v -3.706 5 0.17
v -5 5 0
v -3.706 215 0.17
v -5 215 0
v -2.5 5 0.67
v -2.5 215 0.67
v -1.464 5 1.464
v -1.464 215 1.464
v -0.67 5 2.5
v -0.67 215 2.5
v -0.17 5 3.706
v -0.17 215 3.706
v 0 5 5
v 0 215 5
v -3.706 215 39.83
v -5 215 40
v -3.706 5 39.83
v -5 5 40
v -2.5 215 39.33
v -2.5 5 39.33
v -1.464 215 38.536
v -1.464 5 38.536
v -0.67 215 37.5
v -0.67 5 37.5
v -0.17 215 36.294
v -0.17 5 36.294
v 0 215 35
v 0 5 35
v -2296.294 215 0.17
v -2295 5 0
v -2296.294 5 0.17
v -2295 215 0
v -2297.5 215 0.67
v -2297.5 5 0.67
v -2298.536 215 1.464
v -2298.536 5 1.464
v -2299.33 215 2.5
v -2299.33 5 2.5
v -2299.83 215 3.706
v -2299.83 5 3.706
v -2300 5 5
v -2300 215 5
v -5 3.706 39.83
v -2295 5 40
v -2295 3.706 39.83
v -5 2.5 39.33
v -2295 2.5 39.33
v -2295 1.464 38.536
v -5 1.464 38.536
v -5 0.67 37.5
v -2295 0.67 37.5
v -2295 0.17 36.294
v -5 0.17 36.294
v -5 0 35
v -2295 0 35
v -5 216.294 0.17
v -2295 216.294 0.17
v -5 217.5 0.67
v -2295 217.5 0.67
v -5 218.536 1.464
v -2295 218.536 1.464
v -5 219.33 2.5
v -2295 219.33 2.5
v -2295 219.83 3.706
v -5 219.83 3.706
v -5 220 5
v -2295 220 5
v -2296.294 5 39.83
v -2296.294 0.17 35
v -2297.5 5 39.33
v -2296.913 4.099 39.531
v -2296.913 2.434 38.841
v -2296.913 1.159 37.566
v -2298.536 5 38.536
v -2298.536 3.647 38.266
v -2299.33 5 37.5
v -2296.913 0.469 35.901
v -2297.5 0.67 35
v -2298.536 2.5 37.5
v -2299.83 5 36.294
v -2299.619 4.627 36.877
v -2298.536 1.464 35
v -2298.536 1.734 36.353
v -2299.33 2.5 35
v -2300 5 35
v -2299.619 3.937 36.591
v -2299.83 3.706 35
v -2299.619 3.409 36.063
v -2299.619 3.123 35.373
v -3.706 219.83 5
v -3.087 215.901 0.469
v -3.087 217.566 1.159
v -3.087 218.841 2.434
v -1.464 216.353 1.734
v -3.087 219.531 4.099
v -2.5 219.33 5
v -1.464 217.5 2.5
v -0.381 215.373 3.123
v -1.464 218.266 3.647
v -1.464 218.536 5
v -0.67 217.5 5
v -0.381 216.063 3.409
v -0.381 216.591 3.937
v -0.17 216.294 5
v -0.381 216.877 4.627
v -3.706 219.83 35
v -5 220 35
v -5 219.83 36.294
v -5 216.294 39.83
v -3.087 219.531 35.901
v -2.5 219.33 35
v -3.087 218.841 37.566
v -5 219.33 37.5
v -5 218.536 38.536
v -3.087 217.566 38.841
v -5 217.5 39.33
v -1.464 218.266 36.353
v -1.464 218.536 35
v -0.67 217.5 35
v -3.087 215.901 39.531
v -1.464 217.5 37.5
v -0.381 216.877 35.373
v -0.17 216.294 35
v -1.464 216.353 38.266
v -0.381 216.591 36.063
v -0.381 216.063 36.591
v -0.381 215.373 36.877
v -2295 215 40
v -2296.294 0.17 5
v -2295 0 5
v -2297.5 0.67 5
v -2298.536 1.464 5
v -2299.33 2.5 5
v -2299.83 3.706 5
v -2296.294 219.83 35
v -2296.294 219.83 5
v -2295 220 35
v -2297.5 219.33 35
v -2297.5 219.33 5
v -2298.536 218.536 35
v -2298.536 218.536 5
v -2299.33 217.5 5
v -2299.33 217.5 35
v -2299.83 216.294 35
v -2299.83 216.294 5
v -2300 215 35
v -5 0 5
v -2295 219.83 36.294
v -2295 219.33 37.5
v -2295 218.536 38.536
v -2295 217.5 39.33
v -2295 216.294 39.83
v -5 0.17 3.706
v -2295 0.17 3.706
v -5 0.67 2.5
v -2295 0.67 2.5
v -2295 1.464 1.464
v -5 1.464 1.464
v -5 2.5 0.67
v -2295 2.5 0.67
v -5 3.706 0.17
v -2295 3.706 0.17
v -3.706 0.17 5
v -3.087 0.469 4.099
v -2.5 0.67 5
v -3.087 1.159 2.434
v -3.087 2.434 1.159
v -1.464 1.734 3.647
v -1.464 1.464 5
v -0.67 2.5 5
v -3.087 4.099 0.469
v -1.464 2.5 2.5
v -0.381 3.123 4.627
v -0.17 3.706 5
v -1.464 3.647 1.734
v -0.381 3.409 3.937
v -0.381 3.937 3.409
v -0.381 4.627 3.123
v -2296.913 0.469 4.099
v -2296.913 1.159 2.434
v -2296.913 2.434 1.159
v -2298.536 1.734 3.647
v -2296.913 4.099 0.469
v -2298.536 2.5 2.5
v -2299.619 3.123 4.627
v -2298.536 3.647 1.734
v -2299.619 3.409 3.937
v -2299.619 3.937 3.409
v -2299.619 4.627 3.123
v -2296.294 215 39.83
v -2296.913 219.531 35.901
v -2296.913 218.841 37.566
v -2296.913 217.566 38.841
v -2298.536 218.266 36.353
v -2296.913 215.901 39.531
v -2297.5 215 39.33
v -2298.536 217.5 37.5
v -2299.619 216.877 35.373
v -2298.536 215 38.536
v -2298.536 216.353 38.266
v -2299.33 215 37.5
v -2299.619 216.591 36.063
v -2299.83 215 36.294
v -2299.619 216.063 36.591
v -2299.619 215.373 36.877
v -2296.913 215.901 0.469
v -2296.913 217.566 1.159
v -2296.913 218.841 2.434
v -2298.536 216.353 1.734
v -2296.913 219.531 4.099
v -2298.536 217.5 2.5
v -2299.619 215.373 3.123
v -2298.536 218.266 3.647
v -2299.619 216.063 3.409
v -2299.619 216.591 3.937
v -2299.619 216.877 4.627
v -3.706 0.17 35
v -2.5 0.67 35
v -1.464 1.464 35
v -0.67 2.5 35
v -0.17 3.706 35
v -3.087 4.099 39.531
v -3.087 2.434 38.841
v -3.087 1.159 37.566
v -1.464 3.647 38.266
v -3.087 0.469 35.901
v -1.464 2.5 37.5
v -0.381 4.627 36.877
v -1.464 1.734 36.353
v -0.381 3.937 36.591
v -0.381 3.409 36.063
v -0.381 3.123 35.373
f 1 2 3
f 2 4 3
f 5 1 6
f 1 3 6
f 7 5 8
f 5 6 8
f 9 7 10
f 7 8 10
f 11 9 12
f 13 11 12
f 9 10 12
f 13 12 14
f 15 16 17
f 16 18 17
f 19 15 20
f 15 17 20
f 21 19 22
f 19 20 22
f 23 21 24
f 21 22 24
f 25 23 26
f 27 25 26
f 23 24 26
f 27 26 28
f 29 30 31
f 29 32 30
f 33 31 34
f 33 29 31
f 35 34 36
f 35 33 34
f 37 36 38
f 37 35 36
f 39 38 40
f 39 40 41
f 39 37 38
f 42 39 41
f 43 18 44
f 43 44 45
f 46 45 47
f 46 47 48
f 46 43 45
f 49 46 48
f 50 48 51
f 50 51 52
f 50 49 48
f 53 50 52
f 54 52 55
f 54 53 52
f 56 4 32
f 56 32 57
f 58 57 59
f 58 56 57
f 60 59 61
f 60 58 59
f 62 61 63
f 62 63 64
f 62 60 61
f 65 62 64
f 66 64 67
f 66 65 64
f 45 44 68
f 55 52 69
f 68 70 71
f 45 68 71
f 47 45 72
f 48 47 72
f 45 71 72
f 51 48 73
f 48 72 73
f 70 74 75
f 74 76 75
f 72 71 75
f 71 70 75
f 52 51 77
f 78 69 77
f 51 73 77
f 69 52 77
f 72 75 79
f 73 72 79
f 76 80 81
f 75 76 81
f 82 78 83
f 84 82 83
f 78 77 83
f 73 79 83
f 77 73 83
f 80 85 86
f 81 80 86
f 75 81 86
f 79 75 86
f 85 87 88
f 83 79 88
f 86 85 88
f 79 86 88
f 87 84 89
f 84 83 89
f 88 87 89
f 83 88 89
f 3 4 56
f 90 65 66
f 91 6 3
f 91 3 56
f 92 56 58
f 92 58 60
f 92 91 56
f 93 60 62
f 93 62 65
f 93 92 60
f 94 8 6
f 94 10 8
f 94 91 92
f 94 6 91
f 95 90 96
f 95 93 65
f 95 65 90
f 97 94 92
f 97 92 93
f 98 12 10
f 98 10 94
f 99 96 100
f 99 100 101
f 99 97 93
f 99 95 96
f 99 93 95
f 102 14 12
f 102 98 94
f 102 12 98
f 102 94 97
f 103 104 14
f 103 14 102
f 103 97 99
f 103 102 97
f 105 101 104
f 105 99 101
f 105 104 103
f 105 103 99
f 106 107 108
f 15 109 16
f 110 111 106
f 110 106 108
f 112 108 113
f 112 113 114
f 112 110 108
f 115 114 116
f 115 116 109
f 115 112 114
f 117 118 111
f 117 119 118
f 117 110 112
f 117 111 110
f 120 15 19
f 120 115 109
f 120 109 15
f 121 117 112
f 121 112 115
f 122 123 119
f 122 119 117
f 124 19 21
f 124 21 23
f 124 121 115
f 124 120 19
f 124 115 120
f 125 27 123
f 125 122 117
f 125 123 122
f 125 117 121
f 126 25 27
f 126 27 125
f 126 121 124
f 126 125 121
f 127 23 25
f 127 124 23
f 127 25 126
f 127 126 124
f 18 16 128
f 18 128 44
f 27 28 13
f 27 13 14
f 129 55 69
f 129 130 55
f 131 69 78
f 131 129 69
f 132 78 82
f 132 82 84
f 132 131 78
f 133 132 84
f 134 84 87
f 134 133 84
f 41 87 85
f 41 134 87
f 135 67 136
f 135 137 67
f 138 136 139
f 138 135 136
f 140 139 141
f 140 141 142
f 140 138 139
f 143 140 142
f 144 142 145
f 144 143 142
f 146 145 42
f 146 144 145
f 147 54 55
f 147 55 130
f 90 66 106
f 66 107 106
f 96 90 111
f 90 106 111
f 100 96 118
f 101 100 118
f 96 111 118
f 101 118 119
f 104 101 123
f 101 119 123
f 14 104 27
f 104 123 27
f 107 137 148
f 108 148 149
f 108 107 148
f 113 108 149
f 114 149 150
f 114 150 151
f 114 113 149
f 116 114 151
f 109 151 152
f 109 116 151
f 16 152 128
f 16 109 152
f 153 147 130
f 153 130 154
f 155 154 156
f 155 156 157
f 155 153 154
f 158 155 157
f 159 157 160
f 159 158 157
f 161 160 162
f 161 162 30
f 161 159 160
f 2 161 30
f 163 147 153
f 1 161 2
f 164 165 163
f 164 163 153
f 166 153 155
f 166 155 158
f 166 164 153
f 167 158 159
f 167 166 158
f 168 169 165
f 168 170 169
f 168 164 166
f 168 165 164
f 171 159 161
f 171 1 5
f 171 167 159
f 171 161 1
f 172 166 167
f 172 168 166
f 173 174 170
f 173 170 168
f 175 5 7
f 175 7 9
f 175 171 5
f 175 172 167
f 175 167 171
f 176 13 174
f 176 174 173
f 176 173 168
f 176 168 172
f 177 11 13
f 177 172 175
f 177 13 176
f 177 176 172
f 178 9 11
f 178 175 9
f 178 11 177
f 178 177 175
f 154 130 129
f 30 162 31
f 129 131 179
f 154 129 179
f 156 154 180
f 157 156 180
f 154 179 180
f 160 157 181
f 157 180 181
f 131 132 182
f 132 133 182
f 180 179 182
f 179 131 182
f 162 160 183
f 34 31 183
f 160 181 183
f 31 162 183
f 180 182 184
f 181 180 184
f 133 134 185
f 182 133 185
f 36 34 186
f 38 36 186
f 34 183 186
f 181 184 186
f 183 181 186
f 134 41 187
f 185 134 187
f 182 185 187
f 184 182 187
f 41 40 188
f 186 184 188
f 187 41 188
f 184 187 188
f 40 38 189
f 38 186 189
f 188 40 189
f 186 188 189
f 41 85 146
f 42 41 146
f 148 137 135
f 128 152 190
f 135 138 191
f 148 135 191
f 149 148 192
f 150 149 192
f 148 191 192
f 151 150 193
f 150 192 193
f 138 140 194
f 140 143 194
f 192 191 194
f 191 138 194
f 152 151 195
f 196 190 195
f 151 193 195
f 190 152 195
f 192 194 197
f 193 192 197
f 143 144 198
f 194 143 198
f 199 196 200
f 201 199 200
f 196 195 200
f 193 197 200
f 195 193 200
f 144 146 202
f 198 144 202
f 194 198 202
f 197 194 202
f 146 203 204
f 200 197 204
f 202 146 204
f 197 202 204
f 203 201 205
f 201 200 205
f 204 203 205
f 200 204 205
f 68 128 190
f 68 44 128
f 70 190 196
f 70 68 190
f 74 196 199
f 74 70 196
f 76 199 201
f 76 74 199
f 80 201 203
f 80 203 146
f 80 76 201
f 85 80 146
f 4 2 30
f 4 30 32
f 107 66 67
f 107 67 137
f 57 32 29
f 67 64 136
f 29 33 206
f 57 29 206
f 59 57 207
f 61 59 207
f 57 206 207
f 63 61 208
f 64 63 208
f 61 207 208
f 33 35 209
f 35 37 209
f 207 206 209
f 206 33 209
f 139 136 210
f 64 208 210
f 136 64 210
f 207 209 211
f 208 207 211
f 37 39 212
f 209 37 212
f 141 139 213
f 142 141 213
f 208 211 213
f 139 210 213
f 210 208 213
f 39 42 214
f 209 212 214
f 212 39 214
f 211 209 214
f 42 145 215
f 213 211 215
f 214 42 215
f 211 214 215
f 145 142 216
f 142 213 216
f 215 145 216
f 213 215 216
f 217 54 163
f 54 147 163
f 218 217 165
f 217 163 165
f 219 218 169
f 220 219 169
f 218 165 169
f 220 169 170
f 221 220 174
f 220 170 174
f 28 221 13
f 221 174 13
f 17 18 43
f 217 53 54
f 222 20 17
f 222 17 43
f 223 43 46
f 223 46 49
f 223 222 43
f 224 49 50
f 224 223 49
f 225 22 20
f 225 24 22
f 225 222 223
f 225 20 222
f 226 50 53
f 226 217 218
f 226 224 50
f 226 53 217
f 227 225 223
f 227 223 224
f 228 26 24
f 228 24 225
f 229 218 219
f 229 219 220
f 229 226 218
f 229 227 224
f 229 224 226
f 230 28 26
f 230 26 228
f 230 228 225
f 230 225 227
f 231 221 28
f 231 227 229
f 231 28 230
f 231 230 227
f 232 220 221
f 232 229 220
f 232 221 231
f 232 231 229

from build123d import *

# Parameters (mm, degrees)
F1_DEPTH = 2300
F2_R     = 5
F3_R     = 5


with BuildPart() as f1:
    # F0 (on Right) → F1 (new body)
    with BuildSketch(Plane.YZ):
        with BuildLine():
            ThreePointArc((0, 5), (1.4644660941, 1.4644660941), (5, 0))
            Line((5, 0), (215, 0))
            ThreePointArc((215, 0), (218.5355339059, 1.4644660941), (220, 5))
            Line((220, 5), (220, 35))
            ThreePointArc((220, 35), (218.5355339059, 38.5355339059), (215, 40))
            Line((215, 40), (5, 40))
            ThreePointArc((5, 40), (1.4644660941, 38.5355339059), (0, 35))
            Line((0, 35), (0, 5))
        make_face()
    extrude(amount=-F1_DEPTH)

    # F2
    f2_edges = [f1.edges().sort_by_distance(p)[0] for p in [
        (0, 110, 40),
    ]]
    fillet(f2_edges, radius=F2_R)

    # F3
    f3_edges = [f1.edges().sort_by_distance(p)[0] for p in [
        (-2300, 0, 20),
        (-2300, 1.464466, 1.464466),
        (-2300, 110, 0),
        (-2300, 218.535534, 1.464466),
        (-2300, 220, 20),
        (-2300, 218.535534, 38.535534),
        (-2300, 110, 40),
        (-2300, 1.464466, 38.535534),
    ]]
    fillet(f3_edges, radius=F3_R)


solid = f1.part
